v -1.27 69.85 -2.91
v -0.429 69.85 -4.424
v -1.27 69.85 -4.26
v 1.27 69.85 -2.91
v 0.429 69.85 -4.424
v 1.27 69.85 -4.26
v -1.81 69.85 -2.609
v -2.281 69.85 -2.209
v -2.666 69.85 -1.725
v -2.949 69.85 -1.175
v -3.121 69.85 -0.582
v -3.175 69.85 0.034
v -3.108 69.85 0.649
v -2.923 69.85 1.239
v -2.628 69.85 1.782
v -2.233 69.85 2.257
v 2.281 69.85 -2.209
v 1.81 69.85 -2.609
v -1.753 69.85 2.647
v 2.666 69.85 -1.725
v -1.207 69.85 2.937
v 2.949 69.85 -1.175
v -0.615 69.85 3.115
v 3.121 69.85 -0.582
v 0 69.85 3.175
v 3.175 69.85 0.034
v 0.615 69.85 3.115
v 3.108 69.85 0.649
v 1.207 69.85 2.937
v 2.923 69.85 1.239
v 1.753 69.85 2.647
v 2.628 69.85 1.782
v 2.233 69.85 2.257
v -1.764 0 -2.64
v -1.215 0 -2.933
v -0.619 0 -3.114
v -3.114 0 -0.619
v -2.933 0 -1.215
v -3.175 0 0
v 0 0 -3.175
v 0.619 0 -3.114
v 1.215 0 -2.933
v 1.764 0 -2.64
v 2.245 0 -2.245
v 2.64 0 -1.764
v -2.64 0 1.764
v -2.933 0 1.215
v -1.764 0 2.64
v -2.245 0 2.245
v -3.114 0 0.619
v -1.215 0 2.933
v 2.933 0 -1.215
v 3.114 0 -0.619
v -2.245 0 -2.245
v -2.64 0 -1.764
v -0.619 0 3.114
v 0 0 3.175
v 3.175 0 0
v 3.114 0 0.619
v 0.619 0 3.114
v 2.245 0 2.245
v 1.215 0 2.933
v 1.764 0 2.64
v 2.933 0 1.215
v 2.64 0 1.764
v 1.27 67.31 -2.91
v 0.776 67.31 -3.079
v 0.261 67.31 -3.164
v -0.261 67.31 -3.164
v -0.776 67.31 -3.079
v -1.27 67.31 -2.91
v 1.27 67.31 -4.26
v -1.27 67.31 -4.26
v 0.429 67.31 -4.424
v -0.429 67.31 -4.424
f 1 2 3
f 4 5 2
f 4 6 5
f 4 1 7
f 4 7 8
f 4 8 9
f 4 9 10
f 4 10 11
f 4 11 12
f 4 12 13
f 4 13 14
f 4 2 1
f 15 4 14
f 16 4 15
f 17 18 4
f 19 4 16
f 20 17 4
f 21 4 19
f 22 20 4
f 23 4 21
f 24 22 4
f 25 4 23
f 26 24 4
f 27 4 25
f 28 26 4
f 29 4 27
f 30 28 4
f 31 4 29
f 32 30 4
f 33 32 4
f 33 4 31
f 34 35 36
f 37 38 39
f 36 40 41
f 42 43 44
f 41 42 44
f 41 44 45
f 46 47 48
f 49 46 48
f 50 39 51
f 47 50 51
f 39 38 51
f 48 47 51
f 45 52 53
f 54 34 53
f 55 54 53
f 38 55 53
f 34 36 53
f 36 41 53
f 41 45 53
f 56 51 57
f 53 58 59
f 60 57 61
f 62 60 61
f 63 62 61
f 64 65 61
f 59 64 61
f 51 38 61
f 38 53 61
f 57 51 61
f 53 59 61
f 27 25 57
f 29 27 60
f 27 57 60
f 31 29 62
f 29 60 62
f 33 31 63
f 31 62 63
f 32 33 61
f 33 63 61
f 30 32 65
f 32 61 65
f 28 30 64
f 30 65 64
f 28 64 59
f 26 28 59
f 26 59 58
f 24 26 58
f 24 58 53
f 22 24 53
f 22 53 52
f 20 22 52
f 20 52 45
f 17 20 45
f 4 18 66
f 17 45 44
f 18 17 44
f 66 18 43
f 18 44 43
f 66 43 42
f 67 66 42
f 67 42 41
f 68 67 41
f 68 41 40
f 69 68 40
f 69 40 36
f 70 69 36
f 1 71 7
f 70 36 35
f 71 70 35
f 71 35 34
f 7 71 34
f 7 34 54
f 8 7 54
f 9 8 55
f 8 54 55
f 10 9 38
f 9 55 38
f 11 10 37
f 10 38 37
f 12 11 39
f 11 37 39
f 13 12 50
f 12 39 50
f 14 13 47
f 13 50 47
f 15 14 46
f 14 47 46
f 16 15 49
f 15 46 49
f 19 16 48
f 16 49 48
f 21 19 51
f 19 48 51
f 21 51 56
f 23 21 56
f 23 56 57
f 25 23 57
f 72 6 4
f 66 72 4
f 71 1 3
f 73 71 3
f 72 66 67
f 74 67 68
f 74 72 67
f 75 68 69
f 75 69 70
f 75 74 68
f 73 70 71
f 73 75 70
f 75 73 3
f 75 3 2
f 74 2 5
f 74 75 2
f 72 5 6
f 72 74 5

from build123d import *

# Parameters (mm, degrees)
SKETCH1_R           = 3.175
BOSS_EXTRUDE1_DEPTH = 69.85
BOSS_EXTRUDE2_START = -2.54
BOSS_EXTRUDE2_DEPTH = 2.54


with BuildPart() as part:
    # Sketch1 → Boss-Extrude1 (new body)
    with BuildSketch(Plane(origin=(0, 0, 0), x_dir=(1, 0, 0), z_dir=(0, 1, 0))):
        with Locations(Location((0, 0, 0), (0, 0, 270))):
            Circle(SKETCH1_R)
    extrude(amount=BOSS_EXTRUDE1_DEPTH)

    # Sketch2 → Boss-Extrude2 (add)
    with BuildSketch(Plane(origin=(0, 69.85, 0), x_dir=(1, 0, 0), z_dir=(0, 1, 0)).offset(BOSS_EXTRUDE2_START)):
        with BuildLine():
            Line((1.27, 4.259709497), (1.27, 2.909935566))
            ThreePointArc((1.27, 2.909935566), (0, 3.175), (-1.27, 2.909935566))
            Line((-1.27, 2.909935566), (-1.27, 4.259709497))
            ThreePointArc((-1.27, 4.259709497), (0, 4.445), (1.27, 4.259709497))
        make_face()
    extrude(amount=BOSS_EXTRUDE2_DEPTH)


solid = part.part
